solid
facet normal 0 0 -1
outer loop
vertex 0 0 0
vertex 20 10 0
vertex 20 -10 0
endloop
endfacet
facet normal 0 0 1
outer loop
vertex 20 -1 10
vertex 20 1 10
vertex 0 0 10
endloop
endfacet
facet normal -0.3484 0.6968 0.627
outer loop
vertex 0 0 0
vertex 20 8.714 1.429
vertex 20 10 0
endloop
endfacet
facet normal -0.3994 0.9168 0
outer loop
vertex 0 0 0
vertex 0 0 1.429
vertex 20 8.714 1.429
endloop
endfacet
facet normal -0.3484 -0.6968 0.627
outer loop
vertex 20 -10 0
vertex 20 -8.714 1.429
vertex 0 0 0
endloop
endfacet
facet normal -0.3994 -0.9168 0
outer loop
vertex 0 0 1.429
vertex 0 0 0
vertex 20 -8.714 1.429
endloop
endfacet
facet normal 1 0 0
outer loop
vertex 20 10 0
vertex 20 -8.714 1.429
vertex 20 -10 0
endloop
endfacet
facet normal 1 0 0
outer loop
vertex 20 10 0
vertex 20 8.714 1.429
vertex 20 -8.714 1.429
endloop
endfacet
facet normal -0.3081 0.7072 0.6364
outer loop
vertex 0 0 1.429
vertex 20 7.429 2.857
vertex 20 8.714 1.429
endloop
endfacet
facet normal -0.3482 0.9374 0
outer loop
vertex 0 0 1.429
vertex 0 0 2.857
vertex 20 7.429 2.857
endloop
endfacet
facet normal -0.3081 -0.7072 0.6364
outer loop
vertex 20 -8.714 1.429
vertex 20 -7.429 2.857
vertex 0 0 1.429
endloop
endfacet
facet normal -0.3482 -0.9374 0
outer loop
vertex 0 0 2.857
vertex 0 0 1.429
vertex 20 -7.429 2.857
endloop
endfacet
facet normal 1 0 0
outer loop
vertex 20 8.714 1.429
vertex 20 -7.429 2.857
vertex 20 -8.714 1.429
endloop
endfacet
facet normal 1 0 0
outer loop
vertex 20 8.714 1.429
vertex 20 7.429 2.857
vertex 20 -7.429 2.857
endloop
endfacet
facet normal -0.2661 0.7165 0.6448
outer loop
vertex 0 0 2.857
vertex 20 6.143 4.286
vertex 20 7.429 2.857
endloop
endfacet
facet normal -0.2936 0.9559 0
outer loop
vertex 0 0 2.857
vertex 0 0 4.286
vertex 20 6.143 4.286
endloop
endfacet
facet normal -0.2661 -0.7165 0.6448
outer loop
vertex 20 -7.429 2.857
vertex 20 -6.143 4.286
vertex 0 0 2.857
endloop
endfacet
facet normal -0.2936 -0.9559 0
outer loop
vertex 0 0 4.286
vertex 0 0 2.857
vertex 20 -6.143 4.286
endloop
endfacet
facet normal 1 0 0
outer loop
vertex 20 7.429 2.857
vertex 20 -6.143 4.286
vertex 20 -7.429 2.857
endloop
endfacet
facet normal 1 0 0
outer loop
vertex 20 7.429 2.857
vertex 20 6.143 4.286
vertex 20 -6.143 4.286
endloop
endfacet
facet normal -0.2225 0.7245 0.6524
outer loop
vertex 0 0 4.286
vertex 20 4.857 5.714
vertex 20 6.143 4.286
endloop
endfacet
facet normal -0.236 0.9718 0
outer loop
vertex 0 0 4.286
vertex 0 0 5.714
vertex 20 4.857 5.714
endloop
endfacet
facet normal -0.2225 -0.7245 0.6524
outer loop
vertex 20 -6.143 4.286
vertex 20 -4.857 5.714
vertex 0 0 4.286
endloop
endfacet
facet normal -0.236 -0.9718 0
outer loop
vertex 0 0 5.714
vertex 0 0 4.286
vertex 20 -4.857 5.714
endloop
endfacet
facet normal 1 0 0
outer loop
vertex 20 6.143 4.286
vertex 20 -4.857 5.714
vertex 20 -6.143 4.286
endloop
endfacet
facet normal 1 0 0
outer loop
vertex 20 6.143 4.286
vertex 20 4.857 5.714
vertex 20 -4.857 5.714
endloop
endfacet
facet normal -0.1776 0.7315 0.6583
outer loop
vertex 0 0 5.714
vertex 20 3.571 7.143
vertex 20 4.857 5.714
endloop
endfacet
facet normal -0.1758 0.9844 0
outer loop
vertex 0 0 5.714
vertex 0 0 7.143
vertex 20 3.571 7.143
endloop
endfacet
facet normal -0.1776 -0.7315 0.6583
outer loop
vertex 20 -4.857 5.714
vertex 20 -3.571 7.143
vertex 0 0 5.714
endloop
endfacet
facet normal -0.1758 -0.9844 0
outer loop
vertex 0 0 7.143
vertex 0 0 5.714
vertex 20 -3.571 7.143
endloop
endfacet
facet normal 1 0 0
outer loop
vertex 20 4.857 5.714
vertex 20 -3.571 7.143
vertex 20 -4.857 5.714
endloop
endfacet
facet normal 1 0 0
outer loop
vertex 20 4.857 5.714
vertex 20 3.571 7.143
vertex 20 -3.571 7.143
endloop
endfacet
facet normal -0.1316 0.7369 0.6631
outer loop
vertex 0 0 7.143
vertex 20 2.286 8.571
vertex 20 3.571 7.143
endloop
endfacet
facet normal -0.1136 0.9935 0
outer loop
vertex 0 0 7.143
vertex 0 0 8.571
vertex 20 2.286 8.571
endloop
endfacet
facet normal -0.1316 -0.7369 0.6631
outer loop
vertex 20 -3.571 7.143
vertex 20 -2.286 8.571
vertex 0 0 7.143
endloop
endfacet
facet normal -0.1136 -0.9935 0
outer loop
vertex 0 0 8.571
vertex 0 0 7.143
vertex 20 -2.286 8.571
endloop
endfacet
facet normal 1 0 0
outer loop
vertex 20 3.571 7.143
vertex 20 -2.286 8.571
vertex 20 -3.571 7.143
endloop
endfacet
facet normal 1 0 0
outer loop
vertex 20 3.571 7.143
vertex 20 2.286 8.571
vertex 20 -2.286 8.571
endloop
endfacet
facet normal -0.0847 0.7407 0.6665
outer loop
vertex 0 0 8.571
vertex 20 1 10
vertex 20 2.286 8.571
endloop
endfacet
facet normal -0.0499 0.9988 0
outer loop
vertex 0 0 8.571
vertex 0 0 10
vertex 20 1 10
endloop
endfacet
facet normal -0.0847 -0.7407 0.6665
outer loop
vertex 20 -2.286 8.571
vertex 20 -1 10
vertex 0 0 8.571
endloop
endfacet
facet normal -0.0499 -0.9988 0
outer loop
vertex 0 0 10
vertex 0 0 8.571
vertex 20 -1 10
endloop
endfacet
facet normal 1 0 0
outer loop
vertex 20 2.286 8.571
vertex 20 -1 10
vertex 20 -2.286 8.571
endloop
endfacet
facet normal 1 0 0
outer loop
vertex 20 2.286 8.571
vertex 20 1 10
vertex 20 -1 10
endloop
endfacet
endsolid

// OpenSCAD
linear_extrude(height=10,scale=[1,0.1],slice=20,twist=0)
polygon(points=[[0,0],[20,10],[20,-10]]);
